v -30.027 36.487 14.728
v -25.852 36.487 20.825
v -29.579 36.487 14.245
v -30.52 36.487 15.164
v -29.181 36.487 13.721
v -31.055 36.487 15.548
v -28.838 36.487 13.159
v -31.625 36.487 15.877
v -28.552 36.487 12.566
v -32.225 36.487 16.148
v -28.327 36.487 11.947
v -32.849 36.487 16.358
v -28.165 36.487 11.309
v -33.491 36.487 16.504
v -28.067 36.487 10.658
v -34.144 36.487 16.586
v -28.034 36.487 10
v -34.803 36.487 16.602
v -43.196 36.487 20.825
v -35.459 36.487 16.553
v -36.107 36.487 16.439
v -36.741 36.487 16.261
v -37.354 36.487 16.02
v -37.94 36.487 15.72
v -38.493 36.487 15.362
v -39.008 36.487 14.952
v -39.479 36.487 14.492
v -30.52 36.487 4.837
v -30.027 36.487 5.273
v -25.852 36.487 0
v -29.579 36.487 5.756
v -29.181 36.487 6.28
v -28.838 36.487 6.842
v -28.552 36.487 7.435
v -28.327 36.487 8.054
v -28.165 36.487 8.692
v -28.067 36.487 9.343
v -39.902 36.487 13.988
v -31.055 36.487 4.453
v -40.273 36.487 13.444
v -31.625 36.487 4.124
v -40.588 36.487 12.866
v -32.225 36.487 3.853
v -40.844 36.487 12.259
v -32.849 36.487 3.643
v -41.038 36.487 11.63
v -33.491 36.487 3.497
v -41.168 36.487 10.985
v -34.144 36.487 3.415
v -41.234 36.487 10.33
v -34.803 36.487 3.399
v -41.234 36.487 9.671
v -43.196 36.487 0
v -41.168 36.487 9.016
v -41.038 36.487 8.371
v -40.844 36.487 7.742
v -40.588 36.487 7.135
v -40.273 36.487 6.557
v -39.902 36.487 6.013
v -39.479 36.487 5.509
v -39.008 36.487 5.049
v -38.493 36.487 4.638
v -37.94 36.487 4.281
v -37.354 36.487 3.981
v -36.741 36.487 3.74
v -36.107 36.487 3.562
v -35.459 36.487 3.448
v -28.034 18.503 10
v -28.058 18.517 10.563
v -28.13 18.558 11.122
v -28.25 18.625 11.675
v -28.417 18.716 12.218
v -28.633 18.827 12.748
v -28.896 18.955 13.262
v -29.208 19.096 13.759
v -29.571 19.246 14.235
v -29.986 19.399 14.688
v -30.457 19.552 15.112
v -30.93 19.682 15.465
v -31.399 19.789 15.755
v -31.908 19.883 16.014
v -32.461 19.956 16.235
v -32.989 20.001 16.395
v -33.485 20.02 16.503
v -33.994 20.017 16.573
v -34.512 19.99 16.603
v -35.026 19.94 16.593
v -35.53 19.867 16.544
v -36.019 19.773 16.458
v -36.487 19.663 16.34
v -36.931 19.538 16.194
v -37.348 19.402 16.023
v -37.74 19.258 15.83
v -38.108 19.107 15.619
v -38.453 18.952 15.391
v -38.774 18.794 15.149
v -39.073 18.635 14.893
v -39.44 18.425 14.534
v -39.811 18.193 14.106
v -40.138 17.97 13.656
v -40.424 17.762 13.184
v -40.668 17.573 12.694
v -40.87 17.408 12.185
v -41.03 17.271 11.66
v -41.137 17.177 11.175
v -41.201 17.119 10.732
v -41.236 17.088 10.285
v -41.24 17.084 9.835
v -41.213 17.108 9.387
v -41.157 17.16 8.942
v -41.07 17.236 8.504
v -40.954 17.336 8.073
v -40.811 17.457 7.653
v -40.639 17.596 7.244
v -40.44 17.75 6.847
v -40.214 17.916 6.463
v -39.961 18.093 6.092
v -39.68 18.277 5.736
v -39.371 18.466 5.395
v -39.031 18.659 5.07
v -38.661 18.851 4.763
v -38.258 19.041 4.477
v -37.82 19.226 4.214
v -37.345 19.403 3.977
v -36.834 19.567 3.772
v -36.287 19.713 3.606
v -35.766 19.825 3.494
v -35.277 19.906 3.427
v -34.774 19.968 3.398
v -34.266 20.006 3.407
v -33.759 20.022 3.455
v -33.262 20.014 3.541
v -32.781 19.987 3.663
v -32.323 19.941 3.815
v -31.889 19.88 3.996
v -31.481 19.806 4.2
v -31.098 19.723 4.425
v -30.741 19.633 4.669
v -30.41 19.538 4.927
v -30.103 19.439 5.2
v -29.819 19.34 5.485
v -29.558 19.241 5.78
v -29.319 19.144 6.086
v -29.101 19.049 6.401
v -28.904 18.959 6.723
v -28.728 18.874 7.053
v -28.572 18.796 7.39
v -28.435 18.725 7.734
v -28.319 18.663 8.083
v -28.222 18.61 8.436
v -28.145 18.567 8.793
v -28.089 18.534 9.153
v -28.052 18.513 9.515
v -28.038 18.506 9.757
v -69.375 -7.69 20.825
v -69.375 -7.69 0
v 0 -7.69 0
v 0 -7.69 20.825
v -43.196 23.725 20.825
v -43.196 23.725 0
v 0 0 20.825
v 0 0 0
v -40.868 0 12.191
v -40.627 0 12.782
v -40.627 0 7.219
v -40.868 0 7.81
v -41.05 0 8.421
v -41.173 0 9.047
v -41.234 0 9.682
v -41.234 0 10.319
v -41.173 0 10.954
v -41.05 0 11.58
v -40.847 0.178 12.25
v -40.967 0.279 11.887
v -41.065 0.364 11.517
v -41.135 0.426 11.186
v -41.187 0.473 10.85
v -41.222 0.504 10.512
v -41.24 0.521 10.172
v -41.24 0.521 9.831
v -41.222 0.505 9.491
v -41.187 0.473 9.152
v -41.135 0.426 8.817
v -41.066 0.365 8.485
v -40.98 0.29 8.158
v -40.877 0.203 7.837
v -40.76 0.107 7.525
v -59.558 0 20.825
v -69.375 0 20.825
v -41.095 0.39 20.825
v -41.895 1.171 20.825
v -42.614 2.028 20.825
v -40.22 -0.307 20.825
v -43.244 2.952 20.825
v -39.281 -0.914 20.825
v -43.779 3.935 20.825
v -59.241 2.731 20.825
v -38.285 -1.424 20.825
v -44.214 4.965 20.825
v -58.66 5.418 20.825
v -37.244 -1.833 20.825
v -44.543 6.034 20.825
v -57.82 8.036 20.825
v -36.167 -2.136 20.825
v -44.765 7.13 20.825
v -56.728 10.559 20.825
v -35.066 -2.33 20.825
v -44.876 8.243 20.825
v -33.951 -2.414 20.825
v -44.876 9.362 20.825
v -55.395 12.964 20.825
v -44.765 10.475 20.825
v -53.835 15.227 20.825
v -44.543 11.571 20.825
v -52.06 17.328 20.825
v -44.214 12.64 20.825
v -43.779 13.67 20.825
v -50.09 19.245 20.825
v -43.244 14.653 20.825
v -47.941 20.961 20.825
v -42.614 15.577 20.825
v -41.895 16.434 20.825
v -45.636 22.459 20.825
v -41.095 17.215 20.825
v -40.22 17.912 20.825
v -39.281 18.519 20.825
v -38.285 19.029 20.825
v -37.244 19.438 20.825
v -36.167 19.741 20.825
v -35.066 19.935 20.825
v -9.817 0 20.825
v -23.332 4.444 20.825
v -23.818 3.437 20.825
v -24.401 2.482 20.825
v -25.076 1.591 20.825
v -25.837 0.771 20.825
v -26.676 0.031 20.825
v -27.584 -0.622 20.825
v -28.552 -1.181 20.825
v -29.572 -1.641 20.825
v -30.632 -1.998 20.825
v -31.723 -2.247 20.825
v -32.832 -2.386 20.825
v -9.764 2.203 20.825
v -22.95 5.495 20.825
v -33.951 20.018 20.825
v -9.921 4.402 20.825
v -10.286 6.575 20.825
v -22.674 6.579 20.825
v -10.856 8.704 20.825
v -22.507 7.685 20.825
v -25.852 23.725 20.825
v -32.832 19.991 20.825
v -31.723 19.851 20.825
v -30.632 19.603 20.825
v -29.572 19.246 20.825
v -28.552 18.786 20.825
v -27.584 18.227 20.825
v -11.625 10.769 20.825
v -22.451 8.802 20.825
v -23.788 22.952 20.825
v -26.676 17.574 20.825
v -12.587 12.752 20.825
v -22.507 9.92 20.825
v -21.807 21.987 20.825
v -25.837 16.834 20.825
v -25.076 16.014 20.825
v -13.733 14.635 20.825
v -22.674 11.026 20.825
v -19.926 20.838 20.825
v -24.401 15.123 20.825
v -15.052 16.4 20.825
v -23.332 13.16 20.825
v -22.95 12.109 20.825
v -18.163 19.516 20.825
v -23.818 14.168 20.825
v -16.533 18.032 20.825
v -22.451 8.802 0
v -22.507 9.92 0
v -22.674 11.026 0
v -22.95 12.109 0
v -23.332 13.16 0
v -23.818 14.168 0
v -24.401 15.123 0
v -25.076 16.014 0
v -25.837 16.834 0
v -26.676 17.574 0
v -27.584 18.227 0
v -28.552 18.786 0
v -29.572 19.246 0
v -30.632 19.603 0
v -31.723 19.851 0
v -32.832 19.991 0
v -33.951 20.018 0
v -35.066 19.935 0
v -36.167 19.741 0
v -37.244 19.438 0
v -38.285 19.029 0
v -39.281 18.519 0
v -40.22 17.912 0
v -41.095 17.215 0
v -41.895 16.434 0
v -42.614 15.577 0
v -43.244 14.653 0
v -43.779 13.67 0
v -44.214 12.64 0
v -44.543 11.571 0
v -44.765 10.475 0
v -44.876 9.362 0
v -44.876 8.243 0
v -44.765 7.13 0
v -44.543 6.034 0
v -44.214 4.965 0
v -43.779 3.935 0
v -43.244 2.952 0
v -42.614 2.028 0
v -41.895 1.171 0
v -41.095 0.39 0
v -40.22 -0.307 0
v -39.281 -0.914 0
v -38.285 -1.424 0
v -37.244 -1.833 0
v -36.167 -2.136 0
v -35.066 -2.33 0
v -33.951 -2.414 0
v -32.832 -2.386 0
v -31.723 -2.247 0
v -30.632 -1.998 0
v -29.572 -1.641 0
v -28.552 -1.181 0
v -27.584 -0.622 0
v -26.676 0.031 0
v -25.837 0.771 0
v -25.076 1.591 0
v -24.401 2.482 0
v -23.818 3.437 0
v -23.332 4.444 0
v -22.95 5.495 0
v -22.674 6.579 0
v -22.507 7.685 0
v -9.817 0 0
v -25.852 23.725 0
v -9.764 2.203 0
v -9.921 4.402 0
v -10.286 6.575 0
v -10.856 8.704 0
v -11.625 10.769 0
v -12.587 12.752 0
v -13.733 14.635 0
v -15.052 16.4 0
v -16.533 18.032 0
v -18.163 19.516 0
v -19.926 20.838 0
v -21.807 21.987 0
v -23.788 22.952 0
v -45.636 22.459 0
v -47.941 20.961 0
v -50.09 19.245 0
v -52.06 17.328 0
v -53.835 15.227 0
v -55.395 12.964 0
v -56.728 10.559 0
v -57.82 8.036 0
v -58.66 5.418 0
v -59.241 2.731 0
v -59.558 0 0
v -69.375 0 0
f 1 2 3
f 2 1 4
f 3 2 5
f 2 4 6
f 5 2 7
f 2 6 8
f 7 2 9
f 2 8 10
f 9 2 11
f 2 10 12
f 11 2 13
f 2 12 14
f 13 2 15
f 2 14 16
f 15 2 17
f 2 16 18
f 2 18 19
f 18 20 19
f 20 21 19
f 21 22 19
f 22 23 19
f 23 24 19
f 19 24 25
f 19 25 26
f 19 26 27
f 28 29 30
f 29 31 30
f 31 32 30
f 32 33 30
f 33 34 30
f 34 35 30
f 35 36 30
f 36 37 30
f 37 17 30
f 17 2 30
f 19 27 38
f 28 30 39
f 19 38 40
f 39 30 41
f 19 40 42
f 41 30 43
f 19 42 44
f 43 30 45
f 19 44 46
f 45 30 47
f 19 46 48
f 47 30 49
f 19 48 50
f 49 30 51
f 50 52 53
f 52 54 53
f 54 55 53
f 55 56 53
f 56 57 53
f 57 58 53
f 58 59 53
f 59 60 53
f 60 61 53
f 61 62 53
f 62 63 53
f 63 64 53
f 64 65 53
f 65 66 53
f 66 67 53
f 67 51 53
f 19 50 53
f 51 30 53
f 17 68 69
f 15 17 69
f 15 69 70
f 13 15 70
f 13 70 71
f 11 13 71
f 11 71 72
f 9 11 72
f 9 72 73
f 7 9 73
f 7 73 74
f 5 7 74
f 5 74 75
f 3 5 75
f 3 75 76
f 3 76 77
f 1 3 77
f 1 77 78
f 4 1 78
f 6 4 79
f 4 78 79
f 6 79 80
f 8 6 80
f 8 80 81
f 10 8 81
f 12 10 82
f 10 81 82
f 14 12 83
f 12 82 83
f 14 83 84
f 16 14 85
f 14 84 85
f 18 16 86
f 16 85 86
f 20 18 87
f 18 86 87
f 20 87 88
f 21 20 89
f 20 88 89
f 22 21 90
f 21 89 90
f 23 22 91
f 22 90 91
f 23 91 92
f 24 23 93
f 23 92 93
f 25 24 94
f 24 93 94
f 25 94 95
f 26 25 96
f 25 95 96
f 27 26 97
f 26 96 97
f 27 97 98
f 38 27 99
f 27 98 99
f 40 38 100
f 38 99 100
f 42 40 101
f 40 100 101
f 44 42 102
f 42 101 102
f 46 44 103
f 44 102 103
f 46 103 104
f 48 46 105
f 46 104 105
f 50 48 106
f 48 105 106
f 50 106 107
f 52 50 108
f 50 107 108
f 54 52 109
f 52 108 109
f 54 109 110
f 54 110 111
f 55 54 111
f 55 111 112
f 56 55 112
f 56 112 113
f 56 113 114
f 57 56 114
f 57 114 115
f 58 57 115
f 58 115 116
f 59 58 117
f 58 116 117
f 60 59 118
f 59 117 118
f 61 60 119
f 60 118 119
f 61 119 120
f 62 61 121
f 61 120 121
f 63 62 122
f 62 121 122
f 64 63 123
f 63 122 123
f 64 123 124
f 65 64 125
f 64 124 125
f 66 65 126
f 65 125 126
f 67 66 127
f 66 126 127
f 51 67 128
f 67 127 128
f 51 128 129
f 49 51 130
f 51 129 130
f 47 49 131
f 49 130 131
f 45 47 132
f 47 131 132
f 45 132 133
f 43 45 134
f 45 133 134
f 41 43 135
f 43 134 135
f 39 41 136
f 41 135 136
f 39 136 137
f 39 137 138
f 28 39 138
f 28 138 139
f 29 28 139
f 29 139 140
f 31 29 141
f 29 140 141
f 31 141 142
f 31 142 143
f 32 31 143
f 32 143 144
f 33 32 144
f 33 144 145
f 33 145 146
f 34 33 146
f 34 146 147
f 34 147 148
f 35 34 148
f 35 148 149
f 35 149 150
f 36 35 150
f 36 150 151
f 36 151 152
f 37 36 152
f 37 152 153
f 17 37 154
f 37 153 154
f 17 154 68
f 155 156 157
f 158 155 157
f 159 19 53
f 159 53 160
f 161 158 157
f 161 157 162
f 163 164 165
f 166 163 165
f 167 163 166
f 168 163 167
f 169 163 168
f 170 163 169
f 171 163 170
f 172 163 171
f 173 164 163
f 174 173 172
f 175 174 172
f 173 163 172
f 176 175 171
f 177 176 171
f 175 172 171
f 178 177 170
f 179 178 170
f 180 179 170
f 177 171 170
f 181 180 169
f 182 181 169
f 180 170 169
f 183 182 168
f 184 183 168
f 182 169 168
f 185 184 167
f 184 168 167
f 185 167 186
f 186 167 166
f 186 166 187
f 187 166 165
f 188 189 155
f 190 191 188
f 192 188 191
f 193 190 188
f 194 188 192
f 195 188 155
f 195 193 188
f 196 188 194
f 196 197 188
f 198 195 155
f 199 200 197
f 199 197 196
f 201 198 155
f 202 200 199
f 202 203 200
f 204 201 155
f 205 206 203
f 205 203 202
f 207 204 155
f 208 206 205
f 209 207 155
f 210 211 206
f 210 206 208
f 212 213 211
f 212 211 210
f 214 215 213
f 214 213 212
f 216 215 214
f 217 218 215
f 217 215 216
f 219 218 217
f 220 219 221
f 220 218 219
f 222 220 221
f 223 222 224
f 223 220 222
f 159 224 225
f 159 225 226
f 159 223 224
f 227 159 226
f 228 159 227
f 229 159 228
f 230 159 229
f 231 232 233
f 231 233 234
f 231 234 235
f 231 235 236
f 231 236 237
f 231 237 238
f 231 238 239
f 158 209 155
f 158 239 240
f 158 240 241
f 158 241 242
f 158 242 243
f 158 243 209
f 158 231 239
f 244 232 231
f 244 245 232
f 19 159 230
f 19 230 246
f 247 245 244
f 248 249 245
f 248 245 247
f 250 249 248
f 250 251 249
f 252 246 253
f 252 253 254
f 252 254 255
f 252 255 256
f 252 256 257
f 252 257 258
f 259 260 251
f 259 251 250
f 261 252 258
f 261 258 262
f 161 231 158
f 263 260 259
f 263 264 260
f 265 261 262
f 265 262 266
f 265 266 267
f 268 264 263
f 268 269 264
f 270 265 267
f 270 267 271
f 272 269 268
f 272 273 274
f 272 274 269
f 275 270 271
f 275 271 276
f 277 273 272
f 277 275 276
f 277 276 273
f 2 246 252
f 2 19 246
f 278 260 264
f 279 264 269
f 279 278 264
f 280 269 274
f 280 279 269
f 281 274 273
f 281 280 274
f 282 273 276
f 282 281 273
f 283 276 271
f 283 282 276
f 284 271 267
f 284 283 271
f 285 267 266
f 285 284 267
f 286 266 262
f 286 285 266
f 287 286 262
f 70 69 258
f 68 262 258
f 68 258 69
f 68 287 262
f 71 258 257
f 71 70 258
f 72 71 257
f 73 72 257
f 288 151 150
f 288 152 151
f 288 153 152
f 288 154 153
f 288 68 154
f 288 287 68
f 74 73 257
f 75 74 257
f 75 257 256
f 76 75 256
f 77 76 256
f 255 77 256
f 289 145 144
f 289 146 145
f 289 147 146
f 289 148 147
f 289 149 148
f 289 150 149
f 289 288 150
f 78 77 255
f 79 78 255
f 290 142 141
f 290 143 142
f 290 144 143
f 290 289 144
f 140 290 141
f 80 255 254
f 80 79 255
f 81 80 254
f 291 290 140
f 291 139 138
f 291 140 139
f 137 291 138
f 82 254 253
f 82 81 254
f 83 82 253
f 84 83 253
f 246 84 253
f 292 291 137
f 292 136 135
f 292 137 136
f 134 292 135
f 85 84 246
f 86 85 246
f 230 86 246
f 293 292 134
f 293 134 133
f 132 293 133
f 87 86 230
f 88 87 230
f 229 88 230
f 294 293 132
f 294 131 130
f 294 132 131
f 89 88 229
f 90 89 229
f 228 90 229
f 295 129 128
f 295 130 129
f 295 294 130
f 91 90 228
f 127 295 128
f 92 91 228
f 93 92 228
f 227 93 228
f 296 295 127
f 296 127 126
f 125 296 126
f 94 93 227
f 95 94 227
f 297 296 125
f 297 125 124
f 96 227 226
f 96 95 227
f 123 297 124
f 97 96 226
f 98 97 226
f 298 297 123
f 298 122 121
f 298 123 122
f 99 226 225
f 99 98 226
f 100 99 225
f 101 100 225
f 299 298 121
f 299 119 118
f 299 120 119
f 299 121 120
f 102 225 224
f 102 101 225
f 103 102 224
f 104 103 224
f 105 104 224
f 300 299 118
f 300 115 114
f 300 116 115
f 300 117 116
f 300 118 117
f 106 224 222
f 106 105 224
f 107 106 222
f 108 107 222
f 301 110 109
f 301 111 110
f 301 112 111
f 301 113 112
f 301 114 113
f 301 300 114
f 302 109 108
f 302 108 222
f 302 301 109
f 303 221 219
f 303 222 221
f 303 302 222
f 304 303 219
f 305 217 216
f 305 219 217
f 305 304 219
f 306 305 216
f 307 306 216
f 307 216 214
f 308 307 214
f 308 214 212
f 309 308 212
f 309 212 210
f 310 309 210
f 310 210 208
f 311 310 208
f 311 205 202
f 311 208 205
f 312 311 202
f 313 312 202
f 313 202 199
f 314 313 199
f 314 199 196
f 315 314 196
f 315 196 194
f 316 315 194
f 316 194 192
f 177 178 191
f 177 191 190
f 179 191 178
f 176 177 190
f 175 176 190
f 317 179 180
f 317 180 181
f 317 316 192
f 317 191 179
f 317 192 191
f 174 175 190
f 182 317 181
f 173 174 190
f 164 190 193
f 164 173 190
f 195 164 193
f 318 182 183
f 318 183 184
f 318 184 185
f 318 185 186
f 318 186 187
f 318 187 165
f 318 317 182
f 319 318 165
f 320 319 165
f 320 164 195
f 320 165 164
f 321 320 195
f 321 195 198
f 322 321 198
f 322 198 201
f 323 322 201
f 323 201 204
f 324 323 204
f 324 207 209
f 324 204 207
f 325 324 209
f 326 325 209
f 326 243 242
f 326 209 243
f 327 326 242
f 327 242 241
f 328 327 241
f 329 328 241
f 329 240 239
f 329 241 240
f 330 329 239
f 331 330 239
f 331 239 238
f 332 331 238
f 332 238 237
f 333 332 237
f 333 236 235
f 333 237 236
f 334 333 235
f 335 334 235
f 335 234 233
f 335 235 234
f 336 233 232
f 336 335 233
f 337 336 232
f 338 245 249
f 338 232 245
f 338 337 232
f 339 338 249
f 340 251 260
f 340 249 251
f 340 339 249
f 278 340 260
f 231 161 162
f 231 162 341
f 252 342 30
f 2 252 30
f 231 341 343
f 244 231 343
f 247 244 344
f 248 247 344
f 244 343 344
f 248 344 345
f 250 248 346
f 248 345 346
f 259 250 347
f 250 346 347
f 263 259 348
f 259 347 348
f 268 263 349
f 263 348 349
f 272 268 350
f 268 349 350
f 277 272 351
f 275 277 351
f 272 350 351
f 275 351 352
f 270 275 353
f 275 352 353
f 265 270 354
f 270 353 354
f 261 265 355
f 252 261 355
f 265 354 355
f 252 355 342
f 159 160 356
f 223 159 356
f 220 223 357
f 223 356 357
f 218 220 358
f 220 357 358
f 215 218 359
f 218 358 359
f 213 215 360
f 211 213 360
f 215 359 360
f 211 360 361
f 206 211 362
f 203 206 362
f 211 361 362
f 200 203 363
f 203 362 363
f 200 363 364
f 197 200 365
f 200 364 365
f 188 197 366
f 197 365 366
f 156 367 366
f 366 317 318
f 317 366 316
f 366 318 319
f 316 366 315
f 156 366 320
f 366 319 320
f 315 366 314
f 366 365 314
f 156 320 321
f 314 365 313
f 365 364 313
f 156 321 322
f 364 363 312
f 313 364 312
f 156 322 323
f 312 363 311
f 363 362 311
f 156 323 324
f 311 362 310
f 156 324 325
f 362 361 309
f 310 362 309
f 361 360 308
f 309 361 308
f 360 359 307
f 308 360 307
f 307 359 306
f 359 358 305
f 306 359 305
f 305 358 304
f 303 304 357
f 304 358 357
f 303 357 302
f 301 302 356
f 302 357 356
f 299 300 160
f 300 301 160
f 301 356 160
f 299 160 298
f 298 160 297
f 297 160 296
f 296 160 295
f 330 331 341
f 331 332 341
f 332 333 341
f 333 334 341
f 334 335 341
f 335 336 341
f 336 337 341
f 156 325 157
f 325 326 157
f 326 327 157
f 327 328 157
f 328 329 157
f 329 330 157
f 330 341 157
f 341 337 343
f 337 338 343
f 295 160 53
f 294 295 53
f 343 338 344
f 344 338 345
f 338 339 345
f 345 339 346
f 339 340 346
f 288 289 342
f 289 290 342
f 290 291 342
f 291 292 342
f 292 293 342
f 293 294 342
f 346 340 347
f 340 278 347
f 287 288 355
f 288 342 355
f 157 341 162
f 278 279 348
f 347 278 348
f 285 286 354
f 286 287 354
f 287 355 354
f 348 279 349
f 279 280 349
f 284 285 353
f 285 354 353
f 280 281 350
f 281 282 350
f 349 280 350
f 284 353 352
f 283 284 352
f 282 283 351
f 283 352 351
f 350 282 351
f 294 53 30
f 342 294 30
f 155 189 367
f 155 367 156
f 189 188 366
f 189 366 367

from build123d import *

# Parameters (mm, degrees)
F1_DEPTH = 20.82483
F2_R     = 11.219442
F3_DEPTH = 25.4
F4_R     = 6.603973
F5_DEPTH = 39.32976


with BuildPart() as f1:
    # F0 (on Top) → F1 (new body)
    with BuildSketch(Plane.XY):
        with BuildLine():
            Line((0, 0), (-9.817178, 0))
            ThreePointArc((-9.817178, 0), (-13.732727, 14.634683), (-25.851902, 23.724847))
            Line((-25.851902, 23.724847), (-25.851902, 36.487177))
            Line((-25.851902, 36.487177), (-43.195583, 36.487177))
            Line((-43.195583, 36.487177), (-43.195583, 23.724847))
            ThreePointArc((-43.195583, 23.724847), (-54.642663, 14.114905), (-59.557546, 0))
            Line((-59.557546, 0), (-69.374725, 0))
            Line((-69.374725, 0), (-69.374725, -7.690122))
            Line((-69.374725, -7.690122), (0, -7.690122))
            Line((0, -7.690122), (0, 0))
        make_face()
    extrude(amount=F1_DEPTH)

    # F2 (on Top) → F3 (cut)
    with BuildSketch(Plane.XY):
        with Locations((-33.670925, 8.802438)):
            Circle(F2_R)
    extrude(amount=F3_DEPTH, mode=Mode.SUBTRACT)

    # F4 (on Front) → F5 (cut)
    with BuildSketch(Plane.XZ):
        with Locations((-34.637902, 10.000476)):
            Circle(F4_R)
    extrude(amount=-F5_DEPTH, mode=Mode.SUBTRACT)


solid = f1.part
